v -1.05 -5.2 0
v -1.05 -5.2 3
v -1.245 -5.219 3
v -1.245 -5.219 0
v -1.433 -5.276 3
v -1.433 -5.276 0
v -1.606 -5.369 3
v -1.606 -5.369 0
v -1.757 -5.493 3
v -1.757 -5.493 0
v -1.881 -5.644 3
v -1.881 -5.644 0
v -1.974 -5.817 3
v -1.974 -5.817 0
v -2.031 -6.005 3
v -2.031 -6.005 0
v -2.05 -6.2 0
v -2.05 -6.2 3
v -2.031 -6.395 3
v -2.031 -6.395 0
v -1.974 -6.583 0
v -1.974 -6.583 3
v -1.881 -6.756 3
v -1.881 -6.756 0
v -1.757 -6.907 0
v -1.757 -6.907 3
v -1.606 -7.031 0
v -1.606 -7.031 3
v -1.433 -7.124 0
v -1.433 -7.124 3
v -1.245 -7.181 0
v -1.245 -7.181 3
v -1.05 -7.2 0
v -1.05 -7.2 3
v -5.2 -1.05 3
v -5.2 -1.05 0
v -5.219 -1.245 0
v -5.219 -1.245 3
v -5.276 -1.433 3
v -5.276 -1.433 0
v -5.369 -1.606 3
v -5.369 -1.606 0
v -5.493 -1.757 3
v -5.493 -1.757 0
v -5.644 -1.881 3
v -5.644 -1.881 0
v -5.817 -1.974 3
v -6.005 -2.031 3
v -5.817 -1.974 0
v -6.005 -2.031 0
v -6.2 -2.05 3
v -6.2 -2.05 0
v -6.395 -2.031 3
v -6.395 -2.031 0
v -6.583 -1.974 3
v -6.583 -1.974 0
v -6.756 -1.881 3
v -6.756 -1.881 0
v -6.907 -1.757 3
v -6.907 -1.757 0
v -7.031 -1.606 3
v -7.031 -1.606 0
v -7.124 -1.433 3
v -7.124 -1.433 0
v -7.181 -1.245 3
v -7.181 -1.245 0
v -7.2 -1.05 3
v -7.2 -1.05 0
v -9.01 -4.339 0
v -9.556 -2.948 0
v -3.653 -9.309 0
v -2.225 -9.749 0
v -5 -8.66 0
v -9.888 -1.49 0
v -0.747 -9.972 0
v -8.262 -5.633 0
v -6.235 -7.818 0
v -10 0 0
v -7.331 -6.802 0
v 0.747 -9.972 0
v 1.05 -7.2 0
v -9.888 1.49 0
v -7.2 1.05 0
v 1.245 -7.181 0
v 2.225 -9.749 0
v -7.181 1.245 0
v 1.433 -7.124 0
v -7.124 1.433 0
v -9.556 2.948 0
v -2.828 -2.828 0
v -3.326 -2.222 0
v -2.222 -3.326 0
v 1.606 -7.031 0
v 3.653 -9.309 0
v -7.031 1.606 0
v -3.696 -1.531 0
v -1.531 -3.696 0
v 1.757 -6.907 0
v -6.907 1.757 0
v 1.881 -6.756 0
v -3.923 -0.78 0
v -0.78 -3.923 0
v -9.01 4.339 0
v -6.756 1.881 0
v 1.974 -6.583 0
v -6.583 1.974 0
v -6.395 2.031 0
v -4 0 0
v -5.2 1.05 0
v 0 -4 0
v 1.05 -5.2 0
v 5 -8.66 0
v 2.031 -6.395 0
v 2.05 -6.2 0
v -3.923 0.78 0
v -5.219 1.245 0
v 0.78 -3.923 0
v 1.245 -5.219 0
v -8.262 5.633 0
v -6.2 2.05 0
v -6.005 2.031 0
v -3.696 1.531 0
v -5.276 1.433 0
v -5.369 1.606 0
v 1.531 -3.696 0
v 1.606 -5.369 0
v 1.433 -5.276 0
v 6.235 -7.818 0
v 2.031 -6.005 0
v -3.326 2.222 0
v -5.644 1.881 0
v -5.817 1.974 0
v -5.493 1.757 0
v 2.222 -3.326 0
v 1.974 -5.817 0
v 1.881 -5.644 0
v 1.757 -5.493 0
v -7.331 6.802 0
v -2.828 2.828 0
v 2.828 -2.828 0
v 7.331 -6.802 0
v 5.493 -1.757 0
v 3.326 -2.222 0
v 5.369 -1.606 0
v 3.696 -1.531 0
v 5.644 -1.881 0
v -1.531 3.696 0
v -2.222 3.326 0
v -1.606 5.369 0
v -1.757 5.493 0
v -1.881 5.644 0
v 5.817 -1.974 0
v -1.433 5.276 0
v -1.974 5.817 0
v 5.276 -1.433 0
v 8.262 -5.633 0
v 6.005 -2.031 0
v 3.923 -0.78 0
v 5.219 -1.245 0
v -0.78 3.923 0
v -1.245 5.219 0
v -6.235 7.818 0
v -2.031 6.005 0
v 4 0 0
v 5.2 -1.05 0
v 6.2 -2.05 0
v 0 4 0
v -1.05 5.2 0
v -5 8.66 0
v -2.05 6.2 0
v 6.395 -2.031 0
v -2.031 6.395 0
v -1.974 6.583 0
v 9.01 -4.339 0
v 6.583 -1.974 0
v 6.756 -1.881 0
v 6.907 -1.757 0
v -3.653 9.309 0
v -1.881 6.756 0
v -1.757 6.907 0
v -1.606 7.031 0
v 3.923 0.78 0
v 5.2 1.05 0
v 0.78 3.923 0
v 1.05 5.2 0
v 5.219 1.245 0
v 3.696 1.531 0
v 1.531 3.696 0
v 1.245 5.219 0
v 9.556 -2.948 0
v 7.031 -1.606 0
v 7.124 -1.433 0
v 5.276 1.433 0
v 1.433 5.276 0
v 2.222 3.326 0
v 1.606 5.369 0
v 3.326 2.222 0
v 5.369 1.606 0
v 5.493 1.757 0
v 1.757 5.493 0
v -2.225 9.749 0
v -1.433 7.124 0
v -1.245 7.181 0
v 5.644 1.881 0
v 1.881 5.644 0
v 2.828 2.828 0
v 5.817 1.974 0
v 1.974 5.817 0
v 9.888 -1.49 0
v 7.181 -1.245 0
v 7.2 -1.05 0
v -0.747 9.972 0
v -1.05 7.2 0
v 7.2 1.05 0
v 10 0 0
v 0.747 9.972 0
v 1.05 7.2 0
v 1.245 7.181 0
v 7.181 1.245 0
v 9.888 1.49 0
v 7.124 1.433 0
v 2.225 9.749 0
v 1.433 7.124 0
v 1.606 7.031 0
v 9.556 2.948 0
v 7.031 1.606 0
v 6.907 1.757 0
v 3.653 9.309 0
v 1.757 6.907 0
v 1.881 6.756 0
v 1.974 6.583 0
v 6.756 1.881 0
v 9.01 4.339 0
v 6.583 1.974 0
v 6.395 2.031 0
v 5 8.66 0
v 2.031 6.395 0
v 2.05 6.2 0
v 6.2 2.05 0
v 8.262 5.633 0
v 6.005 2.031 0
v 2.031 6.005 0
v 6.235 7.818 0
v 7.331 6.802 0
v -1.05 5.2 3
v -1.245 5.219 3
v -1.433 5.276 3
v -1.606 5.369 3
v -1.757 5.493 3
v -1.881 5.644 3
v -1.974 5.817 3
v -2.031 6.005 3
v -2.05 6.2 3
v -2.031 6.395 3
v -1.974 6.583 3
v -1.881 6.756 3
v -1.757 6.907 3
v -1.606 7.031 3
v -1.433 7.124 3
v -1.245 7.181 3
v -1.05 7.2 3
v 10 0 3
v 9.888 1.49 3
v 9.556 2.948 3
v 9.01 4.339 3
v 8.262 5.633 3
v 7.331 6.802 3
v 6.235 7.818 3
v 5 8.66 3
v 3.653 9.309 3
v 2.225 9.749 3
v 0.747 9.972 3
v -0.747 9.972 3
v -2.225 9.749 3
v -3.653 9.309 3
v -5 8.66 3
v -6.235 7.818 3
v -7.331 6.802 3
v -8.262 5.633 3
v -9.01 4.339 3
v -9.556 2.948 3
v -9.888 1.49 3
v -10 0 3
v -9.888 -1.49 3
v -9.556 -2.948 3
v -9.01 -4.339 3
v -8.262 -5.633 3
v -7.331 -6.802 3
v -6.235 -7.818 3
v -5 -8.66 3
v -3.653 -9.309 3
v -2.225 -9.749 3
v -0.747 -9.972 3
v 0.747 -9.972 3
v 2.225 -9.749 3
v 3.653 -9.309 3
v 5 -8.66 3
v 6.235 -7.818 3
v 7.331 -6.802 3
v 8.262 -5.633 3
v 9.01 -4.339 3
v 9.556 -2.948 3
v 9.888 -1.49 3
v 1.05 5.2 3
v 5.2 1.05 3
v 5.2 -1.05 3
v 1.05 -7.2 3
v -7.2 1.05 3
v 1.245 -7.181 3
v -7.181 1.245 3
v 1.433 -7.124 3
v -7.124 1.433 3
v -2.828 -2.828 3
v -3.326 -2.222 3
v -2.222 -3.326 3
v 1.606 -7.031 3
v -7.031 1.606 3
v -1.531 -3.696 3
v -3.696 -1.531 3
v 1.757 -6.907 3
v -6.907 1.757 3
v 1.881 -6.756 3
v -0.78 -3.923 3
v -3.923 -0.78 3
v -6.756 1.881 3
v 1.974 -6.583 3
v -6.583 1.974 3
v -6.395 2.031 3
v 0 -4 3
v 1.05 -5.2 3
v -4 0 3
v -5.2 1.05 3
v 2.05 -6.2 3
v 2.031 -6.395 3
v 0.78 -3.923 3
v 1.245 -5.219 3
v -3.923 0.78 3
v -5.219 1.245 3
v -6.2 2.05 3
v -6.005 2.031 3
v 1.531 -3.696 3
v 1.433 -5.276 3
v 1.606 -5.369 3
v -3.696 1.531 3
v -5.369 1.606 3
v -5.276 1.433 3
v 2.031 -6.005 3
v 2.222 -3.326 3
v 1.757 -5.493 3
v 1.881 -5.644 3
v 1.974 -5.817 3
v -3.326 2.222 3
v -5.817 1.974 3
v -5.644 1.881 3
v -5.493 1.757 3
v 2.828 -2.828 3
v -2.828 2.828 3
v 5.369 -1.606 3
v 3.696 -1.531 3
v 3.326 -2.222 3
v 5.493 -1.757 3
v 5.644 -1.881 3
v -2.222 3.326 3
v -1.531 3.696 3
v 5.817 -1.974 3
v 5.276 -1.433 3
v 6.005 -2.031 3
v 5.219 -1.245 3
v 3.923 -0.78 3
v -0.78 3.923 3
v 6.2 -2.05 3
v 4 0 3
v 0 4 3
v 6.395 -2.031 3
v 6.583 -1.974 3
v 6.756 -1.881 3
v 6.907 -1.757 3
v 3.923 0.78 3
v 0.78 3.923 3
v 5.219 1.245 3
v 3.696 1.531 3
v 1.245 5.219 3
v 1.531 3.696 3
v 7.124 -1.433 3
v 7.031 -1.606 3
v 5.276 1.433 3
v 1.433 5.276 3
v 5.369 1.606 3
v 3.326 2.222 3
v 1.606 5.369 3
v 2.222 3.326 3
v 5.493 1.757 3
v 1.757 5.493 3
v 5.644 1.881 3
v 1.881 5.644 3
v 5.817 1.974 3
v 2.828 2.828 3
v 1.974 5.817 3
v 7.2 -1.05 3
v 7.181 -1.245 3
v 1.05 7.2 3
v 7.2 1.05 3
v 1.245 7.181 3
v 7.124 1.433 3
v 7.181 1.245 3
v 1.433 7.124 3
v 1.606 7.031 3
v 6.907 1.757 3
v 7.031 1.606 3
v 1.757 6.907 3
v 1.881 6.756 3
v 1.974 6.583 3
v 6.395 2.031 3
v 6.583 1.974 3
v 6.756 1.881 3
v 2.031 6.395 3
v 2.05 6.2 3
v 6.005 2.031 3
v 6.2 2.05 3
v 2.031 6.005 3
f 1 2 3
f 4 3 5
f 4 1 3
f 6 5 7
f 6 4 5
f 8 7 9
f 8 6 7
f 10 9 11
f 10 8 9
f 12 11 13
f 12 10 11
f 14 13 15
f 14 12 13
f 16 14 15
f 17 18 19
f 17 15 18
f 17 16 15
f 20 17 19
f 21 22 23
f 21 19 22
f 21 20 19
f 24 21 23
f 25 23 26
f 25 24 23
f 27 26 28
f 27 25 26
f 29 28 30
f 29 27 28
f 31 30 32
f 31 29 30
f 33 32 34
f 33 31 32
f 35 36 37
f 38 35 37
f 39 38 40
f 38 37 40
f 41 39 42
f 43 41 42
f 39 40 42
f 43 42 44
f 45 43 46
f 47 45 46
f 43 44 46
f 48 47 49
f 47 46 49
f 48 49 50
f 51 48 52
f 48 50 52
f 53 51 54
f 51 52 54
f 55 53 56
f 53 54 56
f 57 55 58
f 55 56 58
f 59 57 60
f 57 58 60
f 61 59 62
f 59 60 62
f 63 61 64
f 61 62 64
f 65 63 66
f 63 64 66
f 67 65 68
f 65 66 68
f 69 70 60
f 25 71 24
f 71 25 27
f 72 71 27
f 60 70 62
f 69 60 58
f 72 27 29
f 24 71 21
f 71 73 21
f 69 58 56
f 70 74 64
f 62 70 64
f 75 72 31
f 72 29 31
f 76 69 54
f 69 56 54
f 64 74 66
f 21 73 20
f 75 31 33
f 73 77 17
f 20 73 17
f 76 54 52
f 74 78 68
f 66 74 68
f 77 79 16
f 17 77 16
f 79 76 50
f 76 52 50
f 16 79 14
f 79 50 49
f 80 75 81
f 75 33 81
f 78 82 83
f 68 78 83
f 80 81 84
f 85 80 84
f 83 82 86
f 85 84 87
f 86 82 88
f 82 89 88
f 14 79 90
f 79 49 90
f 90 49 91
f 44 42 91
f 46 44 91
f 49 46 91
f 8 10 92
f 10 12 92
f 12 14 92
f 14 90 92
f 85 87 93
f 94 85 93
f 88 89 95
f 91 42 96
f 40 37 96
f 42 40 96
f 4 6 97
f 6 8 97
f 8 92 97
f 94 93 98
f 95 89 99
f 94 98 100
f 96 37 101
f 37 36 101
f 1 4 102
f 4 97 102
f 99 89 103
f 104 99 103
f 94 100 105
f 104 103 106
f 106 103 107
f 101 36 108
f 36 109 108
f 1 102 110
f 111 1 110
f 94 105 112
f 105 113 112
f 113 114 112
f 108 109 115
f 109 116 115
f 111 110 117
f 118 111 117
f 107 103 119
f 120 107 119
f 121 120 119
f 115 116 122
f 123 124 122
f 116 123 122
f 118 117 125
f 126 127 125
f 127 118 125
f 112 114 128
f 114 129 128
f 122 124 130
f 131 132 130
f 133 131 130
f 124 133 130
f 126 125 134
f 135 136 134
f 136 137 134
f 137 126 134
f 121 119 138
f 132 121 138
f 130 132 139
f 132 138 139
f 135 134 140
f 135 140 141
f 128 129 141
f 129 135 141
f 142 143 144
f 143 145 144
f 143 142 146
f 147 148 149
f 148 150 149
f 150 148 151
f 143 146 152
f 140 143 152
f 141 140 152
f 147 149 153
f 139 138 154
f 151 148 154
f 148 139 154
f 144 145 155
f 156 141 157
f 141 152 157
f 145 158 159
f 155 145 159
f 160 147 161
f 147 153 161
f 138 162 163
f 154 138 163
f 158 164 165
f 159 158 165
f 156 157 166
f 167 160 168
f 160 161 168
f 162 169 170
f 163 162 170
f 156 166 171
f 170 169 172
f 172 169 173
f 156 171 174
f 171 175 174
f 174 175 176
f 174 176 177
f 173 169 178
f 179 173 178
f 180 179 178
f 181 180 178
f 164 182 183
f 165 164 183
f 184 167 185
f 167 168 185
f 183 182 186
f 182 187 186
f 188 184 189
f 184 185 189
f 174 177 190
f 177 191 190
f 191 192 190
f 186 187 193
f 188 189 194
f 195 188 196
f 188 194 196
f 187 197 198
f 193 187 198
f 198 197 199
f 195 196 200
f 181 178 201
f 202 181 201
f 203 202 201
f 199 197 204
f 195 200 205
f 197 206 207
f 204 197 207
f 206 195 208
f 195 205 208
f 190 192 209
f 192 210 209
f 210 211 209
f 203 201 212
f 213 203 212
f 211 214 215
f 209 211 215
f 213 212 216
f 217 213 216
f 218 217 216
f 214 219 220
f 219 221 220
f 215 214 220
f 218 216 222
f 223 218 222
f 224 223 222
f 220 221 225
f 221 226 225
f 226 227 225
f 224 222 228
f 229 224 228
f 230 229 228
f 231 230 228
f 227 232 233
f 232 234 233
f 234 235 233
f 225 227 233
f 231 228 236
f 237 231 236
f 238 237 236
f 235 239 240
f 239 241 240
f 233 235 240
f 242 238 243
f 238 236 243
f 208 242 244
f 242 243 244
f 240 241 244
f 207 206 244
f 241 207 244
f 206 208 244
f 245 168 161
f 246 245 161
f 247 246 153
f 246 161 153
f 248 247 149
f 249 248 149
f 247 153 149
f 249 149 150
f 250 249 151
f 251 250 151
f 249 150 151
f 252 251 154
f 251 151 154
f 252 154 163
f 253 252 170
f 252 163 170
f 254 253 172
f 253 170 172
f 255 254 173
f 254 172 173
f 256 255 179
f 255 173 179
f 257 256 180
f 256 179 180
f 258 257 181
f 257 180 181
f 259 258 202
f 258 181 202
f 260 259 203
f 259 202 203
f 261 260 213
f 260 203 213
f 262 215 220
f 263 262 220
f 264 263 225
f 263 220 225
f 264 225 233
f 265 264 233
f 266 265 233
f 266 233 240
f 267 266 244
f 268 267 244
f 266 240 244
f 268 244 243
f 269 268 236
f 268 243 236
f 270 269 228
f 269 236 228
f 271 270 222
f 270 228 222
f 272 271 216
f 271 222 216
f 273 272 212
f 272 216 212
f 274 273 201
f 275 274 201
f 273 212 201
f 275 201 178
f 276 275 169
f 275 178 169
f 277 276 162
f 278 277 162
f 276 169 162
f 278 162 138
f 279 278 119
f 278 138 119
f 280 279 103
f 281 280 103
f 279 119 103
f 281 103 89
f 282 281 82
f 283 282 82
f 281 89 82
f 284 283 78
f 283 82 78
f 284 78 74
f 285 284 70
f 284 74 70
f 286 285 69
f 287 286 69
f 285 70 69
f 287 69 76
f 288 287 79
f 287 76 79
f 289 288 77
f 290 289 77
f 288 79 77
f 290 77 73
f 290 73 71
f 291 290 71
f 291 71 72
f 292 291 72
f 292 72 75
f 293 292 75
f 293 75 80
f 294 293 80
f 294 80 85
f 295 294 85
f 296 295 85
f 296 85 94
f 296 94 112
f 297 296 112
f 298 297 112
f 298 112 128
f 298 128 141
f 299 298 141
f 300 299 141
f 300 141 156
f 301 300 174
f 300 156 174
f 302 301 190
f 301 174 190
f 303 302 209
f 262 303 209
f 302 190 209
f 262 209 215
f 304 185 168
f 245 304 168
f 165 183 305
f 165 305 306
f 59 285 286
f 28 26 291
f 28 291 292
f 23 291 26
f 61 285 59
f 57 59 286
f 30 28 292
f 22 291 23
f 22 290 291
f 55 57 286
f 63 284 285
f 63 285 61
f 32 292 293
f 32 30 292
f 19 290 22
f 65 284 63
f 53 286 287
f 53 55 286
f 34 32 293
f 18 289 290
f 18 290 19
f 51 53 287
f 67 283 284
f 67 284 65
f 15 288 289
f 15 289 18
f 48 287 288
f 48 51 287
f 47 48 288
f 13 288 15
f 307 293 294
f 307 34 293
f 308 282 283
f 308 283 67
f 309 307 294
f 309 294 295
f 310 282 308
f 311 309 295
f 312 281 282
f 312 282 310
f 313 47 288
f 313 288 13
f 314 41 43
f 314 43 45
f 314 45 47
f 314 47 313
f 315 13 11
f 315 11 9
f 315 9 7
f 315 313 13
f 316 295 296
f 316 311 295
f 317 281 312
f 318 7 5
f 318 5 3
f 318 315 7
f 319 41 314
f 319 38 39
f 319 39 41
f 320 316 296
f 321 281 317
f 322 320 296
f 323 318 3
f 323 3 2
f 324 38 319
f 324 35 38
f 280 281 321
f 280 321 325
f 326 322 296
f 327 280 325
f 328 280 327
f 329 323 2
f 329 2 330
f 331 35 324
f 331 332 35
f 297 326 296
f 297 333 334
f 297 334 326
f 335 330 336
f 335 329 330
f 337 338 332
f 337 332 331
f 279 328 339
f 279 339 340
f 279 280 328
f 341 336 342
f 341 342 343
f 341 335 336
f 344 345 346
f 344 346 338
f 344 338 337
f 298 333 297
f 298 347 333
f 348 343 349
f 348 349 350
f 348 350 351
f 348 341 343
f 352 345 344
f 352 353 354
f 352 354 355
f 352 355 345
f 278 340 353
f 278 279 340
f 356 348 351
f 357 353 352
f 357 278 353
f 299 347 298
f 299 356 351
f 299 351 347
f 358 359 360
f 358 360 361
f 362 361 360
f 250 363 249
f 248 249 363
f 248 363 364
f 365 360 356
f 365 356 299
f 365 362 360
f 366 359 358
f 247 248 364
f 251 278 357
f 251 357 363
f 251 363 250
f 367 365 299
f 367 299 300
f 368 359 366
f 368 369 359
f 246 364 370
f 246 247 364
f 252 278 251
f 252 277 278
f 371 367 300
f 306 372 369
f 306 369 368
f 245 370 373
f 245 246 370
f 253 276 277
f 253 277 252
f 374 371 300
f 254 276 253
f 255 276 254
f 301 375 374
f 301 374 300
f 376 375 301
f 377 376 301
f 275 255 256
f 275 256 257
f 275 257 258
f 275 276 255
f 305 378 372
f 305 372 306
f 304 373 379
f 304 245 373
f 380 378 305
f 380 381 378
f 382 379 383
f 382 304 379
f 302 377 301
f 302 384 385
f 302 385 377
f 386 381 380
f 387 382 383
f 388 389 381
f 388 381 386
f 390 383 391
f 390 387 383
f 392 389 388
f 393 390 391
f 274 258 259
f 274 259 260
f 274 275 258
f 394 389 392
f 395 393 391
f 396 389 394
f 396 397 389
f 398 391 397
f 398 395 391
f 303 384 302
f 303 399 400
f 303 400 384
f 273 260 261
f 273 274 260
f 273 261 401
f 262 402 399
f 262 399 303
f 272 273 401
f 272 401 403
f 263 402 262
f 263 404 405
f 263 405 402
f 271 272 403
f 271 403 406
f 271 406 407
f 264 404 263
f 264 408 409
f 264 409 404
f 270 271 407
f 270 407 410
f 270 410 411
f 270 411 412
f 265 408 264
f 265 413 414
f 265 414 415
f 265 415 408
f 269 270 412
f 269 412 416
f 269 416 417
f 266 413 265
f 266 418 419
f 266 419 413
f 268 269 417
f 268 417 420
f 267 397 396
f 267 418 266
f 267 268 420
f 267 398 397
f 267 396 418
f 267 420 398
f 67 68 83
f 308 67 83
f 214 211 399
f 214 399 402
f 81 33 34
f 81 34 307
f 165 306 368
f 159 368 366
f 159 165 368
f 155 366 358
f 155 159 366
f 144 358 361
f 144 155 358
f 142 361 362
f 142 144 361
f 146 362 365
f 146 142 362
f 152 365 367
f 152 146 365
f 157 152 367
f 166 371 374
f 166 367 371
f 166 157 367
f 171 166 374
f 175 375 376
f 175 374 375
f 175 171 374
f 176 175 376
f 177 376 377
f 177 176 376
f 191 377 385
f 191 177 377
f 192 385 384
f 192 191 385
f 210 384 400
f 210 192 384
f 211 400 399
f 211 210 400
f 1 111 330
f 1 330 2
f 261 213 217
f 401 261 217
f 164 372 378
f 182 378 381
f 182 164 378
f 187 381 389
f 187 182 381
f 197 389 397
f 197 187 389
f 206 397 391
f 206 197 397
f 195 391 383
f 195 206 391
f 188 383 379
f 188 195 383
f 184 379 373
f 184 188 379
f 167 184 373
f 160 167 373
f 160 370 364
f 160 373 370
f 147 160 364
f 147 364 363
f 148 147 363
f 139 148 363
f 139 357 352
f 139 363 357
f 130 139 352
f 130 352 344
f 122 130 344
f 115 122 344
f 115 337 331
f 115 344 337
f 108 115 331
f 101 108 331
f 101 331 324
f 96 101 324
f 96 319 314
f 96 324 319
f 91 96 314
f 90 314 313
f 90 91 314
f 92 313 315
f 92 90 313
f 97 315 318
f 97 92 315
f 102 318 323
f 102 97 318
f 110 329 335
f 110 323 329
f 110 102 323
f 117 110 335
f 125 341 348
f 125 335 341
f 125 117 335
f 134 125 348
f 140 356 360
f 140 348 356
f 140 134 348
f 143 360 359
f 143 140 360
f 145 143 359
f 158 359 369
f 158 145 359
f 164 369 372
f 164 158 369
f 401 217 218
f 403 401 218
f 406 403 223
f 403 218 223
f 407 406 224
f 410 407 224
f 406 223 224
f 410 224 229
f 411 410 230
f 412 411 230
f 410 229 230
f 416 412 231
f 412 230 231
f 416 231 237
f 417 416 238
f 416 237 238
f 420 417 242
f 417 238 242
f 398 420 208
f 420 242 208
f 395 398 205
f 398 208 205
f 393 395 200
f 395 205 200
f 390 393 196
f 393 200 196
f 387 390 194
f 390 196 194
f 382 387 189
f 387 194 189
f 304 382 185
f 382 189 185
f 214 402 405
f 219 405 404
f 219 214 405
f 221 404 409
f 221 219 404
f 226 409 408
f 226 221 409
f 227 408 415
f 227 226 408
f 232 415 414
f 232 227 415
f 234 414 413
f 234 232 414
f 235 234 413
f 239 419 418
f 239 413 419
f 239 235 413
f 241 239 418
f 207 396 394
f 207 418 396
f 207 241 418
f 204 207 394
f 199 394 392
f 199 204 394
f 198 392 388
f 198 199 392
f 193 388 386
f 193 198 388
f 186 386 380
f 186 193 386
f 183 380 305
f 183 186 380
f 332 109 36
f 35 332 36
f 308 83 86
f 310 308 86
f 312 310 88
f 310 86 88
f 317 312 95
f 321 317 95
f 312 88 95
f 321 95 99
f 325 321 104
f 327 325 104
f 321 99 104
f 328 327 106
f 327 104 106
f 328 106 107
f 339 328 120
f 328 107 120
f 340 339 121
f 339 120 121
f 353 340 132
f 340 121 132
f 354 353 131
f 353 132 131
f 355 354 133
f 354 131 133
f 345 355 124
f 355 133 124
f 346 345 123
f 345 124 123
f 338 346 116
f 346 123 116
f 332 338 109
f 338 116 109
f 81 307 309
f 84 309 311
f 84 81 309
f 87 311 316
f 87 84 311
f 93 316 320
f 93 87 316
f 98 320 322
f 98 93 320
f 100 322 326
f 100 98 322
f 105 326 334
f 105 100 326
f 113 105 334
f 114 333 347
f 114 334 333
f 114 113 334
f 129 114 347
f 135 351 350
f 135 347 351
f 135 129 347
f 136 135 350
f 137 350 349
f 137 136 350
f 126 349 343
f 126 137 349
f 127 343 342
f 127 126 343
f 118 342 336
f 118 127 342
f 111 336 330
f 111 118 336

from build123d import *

# Parameters (mm, degrees)
SKETCH_1_R          = 10
EXTRUDE_1_DEPTH     = 3
SKETCH_2_R          = 4
CUT_EXTRUDE_1_DEPTH = 4


with BuildPart() as part:
    # 草圖1 → 填料-伸長1 (new body)
    with BuildSketch(Plane.XY):
        Circle(SKETCH_1_R)
    extrude(amount=EXTRUDE_1_DEPTH)

    # 草圖2 → 除料-伸長1 (cut)
    with BuildSketch(Plane.XY):
        Circle(SKETCH_2_R)
        with BuildLine():
            Line((-1.05, 7.2), (1.05, 7.2))
            ThreePointArc((1.05, 7.2), (2.05, 6.2), (1.05, 5.2))
            Line((1.05, 5.2), (-1.05, 5.2))
            ThreePointArc((-1.05, 5.2), (-2.05, 6.2), (-1.05, 7.2))
        make_face()
        with BuildLine():
            Line((-5.2, 1.05), (-5.2, -1.05))
            ThreePointArc((-5.2, -1.05), (-6.2, -2.05), (-7.2, -1.05))
            Line((-7.2, -1.05), (-7.2, 1.05))
            ThreePointArc((-7.2, 1.05), (-6.2, 2.05), (-5.2, 1.05))
        make_face()
        with BuildLine():
            Line((5.2, 1.05), (5.2, -1.05))
            ThreePointArc((5.2, -1.05), (6.2, -2.05), (7.2, -1.05))
            Line((7.2, -1.05), (7.2, 1.05))
            ThreePointArc((7.2, 1.05), (6.2, 2.05), (5.2, 1.05))
        make_face()
        with BuildLine():
            Line((-1.05, -7.2), (1.05, -7.2))
            ThreePointArc((1.05, -7.2), (2.05, -6.2), (1.05, -5.2))
            Line((1.05, -5.2), (-1.05, -5.2))
            ThreePointArc((-1.05, -5.2), (-2.05, -6.2), (-1.05, -7.2))
        make_face()
    extrude(amount=CUT_EXTRUDE_1_DEPTH, mode=Mode.SUBTRACT)


solid = part.part
